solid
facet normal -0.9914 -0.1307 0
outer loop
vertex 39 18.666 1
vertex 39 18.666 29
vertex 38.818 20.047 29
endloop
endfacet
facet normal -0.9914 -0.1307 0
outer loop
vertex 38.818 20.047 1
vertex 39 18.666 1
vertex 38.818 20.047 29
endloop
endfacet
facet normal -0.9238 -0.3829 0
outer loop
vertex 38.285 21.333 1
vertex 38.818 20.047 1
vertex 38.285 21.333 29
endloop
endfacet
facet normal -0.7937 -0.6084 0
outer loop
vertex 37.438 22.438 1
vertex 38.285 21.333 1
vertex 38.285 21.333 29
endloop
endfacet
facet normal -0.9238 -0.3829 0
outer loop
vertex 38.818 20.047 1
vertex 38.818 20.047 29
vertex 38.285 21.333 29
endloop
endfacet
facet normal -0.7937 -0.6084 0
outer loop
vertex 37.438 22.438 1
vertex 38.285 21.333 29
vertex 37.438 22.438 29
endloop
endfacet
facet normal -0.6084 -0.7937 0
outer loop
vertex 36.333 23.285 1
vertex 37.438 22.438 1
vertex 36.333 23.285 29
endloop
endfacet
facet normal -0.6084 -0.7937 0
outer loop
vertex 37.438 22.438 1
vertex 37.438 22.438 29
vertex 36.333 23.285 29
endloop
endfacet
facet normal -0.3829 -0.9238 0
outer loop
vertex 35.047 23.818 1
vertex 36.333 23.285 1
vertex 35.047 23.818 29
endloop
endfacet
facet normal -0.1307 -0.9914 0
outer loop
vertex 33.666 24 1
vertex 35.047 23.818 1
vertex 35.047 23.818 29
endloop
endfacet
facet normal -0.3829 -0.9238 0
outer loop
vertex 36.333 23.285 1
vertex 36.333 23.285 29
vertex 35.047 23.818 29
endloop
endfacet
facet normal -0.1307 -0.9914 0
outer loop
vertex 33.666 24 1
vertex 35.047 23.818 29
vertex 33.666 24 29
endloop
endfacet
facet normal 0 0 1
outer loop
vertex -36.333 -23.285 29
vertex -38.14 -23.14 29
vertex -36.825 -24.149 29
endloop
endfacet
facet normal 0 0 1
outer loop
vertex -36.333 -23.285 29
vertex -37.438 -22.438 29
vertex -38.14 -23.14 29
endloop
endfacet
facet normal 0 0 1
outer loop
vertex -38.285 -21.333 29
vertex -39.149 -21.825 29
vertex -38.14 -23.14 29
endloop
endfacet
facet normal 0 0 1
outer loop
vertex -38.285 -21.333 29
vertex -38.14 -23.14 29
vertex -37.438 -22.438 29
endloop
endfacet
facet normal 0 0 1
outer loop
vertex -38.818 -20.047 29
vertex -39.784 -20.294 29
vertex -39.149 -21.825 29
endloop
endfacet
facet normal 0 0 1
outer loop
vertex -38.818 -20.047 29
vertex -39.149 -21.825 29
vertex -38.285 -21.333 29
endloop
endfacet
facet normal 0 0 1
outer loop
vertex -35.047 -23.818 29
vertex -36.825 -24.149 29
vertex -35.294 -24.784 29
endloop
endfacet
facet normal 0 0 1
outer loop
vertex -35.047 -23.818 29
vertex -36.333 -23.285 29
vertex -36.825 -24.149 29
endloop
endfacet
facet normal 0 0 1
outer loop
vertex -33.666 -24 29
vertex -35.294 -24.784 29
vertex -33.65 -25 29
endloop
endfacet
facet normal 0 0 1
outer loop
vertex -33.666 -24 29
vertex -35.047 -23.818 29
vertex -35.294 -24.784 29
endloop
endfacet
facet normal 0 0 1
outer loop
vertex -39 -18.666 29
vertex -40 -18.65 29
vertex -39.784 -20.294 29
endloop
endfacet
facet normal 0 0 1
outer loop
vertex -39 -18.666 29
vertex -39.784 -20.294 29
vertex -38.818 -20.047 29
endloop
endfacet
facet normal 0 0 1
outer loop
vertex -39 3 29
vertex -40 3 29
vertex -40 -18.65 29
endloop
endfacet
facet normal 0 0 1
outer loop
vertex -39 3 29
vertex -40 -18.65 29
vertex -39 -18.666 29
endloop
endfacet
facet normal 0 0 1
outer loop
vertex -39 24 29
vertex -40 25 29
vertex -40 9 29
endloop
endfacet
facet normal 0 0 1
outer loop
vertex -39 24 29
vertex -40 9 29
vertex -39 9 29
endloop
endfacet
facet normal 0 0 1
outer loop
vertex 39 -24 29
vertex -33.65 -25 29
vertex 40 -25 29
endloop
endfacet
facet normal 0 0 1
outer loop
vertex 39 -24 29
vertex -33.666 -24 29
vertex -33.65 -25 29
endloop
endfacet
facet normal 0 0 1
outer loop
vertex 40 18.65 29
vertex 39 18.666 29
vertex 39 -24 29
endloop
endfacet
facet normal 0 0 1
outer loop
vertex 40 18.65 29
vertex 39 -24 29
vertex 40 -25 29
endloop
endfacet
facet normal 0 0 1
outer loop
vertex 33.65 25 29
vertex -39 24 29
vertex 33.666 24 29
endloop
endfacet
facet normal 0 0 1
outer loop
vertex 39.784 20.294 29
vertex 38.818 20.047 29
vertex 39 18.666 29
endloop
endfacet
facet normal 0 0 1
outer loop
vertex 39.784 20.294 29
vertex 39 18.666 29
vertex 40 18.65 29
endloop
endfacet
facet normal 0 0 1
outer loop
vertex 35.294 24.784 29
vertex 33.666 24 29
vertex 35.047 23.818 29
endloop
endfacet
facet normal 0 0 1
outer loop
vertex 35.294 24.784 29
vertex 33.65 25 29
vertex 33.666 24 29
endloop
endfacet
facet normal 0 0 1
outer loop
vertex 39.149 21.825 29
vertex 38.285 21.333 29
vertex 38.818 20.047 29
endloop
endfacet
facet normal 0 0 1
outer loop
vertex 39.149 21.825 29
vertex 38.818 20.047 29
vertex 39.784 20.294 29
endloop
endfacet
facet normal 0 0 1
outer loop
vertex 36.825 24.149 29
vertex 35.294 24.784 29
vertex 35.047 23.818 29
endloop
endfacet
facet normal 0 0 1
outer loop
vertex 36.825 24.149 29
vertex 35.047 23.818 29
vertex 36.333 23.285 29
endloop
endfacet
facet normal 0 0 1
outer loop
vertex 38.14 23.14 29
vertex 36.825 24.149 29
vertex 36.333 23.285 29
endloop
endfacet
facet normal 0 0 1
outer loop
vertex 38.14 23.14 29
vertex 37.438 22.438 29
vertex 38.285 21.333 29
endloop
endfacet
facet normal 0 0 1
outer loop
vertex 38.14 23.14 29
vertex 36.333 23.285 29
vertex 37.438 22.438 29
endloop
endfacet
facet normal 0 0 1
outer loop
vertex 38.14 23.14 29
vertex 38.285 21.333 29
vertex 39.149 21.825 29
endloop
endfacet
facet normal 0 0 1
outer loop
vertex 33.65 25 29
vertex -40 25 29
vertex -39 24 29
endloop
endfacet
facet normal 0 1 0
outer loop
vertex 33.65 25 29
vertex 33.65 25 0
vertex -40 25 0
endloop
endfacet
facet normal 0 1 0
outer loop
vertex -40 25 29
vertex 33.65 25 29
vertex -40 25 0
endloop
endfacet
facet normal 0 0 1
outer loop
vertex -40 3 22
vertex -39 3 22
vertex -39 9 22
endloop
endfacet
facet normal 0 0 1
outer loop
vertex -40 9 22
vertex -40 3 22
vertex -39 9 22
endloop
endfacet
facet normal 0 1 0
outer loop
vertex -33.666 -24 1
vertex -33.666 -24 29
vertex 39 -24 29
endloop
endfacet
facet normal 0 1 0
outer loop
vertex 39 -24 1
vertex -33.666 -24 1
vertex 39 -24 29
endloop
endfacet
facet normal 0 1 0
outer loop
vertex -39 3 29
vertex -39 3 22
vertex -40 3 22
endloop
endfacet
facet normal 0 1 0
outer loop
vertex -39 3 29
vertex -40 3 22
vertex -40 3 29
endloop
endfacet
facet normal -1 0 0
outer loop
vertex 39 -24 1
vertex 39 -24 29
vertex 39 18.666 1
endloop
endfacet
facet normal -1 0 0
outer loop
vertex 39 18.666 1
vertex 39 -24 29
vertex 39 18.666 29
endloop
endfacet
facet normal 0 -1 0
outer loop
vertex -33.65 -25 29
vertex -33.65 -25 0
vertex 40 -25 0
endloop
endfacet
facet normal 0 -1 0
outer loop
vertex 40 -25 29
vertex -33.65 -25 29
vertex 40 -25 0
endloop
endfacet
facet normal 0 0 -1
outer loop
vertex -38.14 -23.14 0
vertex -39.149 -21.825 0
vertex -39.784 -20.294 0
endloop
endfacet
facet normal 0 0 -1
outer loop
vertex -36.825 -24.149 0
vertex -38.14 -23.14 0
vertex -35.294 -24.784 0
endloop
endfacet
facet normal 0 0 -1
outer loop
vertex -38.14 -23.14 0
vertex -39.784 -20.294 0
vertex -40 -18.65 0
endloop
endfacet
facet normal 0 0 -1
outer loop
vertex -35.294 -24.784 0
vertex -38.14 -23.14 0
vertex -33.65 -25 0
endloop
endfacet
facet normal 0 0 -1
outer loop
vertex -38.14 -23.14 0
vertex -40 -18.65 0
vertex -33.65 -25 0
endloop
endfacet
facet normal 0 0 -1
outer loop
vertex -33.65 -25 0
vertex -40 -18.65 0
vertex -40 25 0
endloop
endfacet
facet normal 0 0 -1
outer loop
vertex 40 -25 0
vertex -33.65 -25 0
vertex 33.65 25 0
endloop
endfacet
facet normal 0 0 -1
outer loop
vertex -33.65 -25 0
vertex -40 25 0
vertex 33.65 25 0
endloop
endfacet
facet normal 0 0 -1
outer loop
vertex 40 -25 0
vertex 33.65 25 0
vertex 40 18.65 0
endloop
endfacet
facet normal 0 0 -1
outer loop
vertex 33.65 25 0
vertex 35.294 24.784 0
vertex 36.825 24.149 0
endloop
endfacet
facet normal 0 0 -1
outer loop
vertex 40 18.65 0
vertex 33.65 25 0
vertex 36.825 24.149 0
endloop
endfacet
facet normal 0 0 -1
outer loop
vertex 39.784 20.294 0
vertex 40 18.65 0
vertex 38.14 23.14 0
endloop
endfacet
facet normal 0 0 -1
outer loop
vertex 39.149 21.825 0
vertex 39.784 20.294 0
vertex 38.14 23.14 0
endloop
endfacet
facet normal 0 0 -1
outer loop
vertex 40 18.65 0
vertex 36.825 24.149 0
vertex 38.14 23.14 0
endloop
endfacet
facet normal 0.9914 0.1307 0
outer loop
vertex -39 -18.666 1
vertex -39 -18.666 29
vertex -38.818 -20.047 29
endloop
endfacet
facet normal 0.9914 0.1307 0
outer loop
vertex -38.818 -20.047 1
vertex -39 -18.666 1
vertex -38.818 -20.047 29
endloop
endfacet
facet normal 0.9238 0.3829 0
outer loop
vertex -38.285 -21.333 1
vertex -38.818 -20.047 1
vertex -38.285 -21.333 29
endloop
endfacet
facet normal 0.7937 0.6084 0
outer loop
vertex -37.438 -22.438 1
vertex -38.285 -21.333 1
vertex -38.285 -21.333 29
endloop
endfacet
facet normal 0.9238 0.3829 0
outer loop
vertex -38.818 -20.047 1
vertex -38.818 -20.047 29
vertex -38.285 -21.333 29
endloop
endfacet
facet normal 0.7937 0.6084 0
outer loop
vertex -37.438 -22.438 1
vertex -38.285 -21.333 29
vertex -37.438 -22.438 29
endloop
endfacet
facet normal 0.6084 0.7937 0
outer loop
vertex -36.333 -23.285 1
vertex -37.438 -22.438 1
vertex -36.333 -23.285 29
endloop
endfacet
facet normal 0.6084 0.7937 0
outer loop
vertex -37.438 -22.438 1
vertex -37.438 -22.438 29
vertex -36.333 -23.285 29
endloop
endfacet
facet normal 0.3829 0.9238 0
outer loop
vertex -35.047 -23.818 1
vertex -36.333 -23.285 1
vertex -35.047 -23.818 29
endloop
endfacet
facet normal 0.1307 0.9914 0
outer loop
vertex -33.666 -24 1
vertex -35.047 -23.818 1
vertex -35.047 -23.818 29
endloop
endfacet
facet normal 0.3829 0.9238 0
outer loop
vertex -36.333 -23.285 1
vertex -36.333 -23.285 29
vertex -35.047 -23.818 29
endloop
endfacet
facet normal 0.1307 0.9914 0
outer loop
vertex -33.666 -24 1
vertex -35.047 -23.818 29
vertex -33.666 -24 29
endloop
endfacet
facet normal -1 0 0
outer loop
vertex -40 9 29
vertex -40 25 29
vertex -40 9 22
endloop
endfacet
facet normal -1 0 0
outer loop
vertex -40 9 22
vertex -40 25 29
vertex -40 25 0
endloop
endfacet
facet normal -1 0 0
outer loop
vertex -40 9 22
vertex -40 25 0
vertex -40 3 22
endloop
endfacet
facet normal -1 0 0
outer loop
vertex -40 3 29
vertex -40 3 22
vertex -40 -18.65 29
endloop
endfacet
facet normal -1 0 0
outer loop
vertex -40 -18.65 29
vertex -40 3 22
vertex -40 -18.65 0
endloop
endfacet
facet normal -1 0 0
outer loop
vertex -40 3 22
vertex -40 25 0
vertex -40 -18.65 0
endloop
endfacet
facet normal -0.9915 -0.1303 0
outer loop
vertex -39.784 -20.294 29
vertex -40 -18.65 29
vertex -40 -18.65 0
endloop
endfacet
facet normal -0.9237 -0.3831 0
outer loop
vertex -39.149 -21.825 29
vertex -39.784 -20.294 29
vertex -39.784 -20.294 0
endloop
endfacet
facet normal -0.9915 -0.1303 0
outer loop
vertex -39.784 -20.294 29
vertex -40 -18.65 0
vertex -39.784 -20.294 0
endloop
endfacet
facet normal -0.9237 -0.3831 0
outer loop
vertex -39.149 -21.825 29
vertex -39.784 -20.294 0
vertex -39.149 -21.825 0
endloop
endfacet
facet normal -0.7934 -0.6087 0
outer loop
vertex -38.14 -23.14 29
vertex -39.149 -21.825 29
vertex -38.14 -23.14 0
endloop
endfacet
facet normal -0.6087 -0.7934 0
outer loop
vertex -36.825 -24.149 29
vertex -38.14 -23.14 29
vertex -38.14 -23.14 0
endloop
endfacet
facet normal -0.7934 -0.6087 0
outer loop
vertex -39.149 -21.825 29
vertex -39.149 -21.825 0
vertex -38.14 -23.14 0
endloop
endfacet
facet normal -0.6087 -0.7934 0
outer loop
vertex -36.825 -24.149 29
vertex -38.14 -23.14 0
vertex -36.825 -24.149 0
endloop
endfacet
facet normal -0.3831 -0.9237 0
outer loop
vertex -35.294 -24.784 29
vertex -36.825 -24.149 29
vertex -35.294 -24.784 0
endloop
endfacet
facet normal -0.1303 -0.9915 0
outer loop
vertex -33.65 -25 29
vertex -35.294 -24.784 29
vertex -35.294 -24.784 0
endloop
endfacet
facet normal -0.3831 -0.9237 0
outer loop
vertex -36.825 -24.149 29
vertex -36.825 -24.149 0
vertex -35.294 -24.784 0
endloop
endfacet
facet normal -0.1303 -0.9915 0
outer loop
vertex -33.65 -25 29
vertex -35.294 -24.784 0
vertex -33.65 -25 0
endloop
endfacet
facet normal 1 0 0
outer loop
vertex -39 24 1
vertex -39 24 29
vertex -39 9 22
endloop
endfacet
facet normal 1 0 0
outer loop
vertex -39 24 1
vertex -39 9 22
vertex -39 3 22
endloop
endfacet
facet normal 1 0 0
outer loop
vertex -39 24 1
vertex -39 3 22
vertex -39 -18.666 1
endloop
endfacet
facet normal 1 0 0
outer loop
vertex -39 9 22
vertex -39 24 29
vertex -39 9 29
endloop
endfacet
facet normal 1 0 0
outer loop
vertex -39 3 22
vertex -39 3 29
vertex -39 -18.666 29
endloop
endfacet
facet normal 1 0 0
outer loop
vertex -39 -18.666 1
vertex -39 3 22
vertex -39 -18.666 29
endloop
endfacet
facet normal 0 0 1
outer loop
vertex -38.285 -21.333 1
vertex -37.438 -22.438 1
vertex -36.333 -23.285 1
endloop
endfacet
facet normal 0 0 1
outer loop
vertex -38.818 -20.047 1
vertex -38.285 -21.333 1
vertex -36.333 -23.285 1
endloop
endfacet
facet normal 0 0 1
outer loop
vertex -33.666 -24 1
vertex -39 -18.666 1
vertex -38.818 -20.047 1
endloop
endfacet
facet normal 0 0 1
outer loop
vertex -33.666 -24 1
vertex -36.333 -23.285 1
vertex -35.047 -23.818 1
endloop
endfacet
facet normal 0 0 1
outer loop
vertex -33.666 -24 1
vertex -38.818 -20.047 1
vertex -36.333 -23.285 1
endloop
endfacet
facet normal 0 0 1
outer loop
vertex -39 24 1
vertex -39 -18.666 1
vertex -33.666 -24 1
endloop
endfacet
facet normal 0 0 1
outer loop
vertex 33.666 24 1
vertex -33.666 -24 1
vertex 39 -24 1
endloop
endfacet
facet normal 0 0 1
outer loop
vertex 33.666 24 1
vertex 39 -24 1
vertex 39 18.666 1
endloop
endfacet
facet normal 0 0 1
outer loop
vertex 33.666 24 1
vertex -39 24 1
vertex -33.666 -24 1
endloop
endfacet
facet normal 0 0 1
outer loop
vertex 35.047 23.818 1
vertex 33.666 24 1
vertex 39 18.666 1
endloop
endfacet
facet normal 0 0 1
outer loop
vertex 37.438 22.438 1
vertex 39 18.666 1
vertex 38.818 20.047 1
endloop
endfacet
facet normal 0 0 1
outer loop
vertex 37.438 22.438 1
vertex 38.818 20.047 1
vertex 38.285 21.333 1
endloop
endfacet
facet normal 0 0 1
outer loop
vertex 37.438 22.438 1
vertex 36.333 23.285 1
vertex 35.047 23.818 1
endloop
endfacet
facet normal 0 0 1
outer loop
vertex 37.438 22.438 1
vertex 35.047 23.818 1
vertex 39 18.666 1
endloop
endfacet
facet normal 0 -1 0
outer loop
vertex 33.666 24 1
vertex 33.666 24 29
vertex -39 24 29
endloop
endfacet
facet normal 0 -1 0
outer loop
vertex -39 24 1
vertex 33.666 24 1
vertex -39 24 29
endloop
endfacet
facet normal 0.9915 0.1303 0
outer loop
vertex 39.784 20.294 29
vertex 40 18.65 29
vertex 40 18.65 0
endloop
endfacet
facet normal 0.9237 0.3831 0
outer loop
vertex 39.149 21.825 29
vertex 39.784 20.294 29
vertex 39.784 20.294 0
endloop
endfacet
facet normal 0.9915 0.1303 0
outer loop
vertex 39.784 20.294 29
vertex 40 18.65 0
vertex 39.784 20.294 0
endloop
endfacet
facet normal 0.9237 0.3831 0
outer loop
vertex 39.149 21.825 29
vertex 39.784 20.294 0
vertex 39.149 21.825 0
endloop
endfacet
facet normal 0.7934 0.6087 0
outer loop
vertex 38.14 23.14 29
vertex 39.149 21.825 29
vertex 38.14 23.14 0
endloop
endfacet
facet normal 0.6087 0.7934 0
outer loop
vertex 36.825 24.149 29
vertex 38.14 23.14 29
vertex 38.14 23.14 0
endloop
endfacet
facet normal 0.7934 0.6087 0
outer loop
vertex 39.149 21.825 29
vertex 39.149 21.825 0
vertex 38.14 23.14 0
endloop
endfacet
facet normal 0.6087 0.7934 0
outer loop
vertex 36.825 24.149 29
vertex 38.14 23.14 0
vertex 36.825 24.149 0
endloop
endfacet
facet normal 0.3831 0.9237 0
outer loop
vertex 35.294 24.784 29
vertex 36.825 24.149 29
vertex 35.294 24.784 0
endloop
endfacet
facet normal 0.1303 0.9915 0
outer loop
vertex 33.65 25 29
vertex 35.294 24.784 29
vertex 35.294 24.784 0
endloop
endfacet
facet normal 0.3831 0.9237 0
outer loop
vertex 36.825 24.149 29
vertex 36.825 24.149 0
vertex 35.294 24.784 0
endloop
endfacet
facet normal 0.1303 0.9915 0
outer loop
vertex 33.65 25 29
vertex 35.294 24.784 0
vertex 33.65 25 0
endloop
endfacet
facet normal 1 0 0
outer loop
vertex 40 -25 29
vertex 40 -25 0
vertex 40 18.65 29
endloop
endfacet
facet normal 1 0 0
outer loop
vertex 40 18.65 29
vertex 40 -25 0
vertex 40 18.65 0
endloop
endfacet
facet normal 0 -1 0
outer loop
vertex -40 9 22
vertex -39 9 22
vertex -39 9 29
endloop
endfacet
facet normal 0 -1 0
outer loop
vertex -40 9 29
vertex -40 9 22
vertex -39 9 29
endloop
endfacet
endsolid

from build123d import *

# Parameters (mm, degrees)
F1_DEPTH = 29
F3_DEPTH = 28
F4_W     = 6
F4_H     = 7
F5_DEPTH = 44.45


# Not quite as in the source:
# - a feature names something its author has since deleted; it is built from what else it names


with BuildPart() as f1:
    # F0 (on Top) → F1 (new body)
    with BuildSketch(Plane.XY):
        with BuildLine():
            Line((-33.65, -25), (40, -25))
            Line((40, -25), (40, 18.65))
            ThreePointArc((40, 18.65), (38.1401280605, 23.1401280605), (33.65, 25))
            Line((33.65, 25), (-40, 25))
            Line((-40, 25), (-40, -18.65))
            ThreePointArc((-40, -18.65), (-38.1401280605, -23.1401280605), (-33.65, -25))
        make_face()
    extrude(amount=F1_DEPTH)

    # F2 (on face) → F3 (cut)
    with BuildSketch(Plane.XY.offset(29)):
        with BuildLine():
            Line((33.666, 24), (-39, 24))
            Line((-39, 24), (-39, -18.666))
            ThreePointArc((-39, -18.666), (-37.4377075708, -22.4377075708), (-33.666, -24))
            Line((-33.666, -24), (39, -24))
            Line((39, -24), (39, 18.666))
            ThreePointArc((39, 18.666), (37.4377075708, 22.4377075708), (33.666, 24))
        make_face()
    extrude(amount=-F3_DEPTH, mode=Mode.SUBTRACT)

    # F4 (on face) → F5 (cut)
    with BuildSketch(Plane.YZ.offset(-39)):
        with Locations((6, 25.5)):
            Rectangle(F4_W, F4_H)
    extrude(amount=-F5_DEPTH, mode=Mode.SUBTRACT)


solid = f1.part
